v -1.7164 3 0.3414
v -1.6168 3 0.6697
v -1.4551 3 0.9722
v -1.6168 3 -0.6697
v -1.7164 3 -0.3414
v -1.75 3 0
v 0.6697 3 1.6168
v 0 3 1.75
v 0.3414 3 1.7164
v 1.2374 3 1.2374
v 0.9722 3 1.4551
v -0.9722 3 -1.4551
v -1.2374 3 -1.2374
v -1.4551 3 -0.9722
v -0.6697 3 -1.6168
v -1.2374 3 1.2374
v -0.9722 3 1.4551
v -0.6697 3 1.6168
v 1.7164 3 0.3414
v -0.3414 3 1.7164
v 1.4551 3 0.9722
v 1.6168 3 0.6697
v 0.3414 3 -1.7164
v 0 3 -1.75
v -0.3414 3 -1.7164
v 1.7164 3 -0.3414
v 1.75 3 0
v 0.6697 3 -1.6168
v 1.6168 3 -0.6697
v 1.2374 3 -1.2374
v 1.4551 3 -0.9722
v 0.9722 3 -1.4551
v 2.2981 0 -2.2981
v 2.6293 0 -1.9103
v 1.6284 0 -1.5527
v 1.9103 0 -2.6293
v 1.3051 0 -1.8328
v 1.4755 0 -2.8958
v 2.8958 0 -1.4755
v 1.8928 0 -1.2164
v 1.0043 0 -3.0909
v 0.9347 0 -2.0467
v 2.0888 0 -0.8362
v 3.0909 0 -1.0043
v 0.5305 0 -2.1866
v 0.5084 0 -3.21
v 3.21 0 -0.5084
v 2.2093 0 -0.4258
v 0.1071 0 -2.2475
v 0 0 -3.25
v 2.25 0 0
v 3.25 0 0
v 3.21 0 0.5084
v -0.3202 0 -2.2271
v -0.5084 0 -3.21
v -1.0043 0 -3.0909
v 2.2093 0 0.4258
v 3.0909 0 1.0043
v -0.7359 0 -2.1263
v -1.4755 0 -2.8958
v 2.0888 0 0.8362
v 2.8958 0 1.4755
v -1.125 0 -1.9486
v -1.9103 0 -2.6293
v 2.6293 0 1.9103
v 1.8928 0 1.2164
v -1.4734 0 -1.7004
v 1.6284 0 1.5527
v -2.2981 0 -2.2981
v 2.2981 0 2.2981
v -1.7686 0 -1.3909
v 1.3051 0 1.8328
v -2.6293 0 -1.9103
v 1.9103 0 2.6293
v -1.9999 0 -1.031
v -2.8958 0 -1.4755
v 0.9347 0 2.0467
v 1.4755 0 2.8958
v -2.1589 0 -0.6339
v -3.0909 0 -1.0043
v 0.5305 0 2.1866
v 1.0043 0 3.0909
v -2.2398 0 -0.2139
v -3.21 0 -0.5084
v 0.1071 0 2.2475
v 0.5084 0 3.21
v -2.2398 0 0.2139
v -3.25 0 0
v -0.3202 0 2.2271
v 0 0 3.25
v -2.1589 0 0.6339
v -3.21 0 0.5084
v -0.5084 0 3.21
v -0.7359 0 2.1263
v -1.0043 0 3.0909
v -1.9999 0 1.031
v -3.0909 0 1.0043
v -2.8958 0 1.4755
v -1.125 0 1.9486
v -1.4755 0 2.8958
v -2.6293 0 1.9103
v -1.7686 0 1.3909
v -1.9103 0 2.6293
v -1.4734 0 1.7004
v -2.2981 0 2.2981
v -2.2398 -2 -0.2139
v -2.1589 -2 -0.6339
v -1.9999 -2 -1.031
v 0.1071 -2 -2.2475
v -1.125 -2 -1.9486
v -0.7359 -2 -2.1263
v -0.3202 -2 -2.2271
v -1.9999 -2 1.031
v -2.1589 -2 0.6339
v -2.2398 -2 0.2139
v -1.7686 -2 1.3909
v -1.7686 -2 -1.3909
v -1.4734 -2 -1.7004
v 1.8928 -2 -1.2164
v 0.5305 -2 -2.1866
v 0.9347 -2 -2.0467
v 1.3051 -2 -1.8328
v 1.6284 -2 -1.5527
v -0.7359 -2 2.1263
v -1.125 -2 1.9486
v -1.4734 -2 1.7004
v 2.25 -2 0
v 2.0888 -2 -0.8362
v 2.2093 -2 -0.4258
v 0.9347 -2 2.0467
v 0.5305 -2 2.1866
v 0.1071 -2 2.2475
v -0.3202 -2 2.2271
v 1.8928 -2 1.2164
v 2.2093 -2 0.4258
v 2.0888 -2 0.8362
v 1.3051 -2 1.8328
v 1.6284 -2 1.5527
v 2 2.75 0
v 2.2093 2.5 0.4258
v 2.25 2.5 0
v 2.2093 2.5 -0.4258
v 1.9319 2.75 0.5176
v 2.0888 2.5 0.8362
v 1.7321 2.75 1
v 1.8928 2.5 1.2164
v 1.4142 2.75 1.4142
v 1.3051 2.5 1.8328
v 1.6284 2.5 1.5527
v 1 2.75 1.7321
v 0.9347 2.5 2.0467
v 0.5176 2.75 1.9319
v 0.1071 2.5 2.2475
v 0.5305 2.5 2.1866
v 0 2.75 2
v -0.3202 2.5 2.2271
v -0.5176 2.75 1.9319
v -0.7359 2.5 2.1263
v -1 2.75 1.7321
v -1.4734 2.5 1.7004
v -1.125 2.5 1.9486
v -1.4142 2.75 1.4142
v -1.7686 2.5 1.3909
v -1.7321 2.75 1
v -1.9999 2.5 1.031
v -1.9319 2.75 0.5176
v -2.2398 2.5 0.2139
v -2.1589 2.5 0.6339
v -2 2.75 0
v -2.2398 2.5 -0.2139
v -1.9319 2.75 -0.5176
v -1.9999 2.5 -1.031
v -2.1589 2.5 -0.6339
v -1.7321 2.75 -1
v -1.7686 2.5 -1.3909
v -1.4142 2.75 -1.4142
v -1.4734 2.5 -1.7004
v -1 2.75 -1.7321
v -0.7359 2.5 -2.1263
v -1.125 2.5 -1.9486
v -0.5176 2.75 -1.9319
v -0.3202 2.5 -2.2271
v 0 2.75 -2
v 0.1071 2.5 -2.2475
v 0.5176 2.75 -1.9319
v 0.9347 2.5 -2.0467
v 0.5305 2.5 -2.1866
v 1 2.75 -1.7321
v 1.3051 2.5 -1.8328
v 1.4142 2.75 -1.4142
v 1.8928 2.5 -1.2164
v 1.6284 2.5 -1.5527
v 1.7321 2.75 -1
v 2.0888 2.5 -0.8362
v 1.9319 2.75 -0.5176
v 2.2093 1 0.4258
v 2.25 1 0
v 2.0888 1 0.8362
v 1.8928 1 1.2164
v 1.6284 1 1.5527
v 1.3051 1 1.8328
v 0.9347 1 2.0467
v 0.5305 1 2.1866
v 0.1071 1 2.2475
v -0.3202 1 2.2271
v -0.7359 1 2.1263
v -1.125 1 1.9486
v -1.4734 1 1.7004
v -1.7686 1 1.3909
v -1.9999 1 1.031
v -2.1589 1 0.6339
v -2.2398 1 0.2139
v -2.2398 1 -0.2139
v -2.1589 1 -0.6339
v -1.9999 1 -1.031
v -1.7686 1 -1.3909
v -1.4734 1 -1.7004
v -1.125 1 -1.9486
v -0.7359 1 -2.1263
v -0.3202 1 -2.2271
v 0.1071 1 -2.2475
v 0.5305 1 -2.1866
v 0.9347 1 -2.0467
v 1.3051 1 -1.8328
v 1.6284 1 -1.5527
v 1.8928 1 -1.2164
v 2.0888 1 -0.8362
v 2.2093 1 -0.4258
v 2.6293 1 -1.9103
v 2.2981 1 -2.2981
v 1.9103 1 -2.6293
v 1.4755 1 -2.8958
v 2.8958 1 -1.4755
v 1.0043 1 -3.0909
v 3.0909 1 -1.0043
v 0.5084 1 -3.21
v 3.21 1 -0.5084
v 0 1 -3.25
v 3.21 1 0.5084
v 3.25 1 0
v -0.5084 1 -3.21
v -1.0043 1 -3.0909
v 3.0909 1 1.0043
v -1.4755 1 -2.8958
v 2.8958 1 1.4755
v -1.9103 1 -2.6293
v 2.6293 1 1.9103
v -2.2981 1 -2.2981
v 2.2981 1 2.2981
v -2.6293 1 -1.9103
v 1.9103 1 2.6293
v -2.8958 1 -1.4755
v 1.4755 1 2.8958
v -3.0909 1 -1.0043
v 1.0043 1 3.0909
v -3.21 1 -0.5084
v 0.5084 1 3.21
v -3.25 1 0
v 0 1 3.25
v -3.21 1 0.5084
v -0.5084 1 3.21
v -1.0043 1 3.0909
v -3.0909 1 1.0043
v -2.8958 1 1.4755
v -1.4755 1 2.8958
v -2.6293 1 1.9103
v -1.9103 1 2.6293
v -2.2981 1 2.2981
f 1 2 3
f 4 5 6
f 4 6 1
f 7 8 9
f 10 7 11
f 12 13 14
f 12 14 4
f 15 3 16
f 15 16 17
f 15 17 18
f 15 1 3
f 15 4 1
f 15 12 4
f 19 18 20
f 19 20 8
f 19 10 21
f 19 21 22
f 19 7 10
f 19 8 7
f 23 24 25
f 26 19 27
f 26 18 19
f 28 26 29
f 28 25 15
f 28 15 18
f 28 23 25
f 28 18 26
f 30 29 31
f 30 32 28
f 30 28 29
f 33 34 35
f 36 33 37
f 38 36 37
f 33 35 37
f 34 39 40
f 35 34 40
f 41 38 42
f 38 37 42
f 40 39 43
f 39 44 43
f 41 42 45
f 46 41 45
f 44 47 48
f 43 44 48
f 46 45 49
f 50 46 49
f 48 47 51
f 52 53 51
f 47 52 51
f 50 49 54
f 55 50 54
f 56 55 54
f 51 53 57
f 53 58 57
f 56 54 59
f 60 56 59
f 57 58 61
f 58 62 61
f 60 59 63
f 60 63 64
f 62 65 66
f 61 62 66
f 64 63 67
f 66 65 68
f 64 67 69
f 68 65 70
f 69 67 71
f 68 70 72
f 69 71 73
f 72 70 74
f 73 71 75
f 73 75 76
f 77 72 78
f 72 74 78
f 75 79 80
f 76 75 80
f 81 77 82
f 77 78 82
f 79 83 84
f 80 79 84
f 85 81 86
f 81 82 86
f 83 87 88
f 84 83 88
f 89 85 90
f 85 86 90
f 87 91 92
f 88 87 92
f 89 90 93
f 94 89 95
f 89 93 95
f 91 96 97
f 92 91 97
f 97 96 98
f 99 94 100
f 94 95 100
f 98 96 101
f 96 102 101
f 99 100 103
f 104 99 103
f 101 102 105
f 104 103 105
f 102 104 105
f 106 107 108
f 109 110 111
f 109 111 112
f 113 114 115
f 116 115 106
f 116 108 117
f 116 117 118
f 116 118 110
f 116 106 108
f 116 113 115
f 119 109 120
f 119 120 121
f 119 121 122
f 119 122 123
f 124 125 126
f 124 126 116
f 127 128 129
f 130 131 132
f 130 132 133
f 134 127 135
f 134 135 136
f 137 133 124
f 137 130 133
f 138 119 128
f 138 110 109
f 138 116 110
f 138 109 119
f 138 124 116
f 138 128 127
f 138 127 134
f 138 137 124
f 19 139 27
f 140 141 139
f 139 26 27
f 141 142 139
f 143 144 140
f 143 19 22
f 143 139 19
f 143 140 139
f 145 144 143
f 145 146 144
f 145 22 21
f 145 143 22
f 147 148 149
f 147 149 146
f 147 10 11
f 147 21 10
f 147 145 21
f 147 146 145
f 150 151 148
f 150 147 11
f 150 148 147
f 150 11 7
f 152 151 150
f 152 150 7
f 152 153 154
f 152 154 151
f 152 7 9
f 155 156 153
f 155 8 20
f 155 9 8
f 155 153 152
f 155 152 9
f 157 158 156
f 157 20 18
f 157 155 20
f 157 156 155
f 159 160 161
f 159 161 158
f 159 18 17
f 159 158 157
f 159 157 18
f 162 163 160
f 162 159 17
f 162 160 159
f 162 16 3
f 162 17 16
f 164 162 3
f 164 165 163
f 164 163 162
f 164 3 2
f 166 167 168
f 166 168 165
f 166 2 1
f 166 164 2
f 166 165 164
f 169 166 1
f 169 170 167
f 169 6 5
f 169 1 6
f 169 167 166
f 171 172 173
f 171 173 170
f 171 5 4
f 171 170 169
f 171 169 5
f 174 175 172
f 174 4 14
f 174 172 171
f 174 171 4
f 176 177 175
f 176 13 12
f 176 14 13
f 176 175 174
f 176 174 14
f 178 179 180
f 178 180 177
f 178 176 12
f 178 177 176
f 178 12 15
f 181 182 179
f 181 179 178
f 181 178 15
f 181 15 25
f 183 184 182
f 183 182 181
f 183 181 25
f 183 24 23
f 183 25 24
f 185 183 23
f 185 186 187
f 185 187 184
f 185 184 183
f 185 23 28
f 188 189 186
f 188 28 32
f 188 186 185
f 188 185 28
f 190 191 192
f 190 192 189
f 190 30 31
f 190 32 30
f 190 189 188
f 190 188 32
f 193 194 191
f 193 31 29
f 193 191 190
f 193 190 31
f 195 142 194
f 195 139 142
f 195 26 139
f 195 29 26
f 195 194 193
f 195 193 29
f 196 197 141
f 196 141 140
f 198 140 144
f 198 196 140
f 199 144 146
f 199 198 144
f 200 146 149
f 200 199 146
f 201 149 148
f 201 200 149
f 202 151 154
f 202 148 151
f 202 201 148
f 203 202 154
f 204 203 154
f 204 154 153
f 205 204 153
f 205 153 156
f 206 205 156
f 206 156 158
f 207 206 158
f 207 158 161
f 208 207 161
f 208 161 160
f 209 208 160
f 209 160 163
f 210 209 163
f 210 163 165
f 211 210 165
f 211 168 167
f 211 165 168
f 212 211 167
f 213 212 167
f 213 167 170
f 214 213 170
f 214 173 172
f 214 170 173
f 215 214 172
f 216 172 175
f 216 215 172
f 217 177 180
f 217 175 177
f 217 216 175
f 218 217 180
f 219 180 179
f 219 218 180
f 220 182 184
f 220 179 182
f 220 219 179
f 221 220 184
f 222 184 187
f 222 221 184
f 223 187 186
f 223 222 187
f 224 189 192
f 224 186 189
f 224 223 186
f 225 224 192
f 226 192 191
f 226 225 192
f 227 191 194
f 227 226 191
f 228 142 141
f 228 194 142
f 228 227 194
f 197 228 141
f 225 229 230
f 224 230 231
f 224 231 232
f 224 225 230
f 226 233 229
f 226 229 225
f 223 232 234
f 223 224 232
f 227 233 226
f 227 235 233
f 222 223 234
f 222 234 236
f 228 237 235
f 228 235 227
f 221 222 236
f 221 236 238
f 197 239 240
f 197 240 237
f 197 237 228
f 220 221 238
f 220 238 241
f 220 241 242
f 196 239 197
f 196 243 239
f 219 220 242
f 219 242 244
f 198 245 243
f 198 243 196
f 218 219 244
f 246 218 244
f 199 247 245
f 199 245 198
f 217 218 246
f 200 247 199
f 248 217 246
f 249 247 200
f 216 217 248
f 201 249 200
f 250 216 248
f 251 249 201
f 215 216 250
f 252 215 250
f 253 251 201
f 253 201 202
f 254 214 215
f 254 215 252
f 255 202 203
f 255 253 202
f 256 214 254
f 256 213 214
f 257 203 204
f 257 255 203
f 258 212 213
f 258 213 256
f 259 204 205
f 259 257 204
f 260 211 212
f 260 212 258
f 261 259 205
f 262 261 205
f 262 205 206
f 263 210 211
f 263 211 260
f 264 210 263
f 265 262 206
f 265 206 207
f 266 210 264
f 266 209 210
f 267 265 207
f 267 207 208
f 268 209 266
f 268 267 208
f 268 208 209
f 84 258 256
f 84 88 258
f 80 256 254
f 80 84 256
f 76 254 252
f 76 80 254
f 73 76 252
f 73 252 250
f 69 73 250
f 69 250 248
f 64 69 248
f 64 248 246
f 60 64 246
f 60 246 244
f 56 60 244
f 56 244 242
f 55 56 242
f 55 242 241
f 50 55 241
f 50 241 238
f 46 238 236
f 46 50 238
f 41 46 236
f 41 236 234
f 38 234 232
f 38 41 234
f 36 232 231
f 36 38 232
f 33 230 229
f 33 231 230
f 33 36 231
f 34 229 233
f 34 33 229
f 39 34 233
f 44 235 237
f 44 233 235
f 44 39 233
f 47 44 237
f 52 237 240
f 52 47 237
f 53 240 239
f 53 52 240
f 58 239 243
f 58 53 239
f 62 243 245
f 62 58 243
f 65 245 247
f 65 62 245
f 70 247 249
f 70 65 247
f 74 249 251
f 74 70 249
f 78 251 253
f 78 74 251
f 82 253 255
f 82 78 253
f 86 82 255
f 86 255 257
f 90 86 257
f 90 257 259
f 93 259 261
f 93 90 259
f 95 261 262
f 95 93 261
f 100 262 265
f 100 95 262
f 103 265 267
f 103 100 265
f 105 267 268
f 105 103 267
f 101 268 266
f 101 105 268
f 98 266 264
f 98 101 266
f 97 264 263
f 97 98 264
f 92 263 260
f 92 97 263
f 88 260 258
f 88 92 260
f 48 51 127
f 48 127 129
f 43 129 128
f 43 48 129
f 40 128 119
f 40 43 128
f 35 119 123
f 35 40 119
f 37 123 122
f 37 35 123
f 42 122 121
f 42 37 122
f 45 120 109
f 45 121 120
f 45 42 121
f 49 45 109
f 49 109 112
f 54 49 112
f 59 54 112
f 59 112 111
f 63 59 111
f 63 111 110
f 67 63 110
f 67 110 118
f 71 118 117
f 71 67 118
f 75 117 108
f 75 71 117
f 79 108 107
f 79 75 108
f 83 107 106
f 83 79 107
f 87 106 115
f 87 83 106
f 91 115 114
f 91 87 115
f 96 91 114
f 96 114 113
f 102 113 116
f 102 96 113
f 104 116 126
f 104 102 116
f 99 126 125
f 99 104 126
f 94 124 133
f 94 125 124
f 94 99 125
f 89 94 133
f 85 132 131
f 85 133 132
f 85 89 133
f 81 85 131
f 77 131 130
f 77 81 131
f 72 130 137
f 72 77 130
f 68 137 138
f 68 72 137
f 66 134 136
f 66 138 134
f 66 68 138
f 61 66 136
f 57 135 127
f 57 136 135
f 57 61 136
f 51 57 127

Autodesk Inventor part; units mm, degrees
ref_plane "YZ Plane" through (0, 0, 0) normal (1, 0, 0) x (0, 1, 0)
ref_plane "XZ Plane" through (0, 0, 0) normal (0, 1, 0) x (-1, 0, 0)
sketch "Sketch1" plane through (0, 0, 0) normal (0, 1, 0) x (-1, 0, 0)
  circle A0 centre (0, 0) radius 3.25
  dimension "d0" = 6.5
extrude "Extrusion1" add sketch "Sketch1" along normal blind 1
sketch "Sketch2" plane through (0, 1, 0) normal (0, 1, 0) x (1, 0, 0)
  circle A0 centre (0, 0) radius 2.25
  dimension "d3" = 4.5
extrude "Extrusion2" add sketch "Sketch2" along normal blind 2
sketch "Sketch3" plane through (0, 0, 0) normal (0, -1, 0) x (1, 0, 0)
  circle A0 centre (0, 0) radius 2.25
extrude "Extrusion3" add sketch "Sketch3" along normal blind 2
sketch "Sketch4" plane through (0, 0, 0) normal (0, 0, 1) x (1, 0, 0)
  point P0 (0, 0)
chamfer "Chamfer1" distance 0.5 angle 45 1 edges at (-2.25, 3, 0)
equation "\"BendRadius\" = Thickness"
equation "\"BendReliefWidth\" = Thickness"
equation "\"BendReliefDepth\" = 0.5 * Thickness"
equation "\"CornerReliefSize\" = 4 * Thickness"
equation "\"MinimumRemnant\" = 2 * Thickness"
equation "\"TransitionRadius\" = BendRadius"
equation "\"JacobiRadiusSize\" = BendRadius"
equation "\"GapSize\" = Thickness"
equation "\"Thickness\" = 0.5"
